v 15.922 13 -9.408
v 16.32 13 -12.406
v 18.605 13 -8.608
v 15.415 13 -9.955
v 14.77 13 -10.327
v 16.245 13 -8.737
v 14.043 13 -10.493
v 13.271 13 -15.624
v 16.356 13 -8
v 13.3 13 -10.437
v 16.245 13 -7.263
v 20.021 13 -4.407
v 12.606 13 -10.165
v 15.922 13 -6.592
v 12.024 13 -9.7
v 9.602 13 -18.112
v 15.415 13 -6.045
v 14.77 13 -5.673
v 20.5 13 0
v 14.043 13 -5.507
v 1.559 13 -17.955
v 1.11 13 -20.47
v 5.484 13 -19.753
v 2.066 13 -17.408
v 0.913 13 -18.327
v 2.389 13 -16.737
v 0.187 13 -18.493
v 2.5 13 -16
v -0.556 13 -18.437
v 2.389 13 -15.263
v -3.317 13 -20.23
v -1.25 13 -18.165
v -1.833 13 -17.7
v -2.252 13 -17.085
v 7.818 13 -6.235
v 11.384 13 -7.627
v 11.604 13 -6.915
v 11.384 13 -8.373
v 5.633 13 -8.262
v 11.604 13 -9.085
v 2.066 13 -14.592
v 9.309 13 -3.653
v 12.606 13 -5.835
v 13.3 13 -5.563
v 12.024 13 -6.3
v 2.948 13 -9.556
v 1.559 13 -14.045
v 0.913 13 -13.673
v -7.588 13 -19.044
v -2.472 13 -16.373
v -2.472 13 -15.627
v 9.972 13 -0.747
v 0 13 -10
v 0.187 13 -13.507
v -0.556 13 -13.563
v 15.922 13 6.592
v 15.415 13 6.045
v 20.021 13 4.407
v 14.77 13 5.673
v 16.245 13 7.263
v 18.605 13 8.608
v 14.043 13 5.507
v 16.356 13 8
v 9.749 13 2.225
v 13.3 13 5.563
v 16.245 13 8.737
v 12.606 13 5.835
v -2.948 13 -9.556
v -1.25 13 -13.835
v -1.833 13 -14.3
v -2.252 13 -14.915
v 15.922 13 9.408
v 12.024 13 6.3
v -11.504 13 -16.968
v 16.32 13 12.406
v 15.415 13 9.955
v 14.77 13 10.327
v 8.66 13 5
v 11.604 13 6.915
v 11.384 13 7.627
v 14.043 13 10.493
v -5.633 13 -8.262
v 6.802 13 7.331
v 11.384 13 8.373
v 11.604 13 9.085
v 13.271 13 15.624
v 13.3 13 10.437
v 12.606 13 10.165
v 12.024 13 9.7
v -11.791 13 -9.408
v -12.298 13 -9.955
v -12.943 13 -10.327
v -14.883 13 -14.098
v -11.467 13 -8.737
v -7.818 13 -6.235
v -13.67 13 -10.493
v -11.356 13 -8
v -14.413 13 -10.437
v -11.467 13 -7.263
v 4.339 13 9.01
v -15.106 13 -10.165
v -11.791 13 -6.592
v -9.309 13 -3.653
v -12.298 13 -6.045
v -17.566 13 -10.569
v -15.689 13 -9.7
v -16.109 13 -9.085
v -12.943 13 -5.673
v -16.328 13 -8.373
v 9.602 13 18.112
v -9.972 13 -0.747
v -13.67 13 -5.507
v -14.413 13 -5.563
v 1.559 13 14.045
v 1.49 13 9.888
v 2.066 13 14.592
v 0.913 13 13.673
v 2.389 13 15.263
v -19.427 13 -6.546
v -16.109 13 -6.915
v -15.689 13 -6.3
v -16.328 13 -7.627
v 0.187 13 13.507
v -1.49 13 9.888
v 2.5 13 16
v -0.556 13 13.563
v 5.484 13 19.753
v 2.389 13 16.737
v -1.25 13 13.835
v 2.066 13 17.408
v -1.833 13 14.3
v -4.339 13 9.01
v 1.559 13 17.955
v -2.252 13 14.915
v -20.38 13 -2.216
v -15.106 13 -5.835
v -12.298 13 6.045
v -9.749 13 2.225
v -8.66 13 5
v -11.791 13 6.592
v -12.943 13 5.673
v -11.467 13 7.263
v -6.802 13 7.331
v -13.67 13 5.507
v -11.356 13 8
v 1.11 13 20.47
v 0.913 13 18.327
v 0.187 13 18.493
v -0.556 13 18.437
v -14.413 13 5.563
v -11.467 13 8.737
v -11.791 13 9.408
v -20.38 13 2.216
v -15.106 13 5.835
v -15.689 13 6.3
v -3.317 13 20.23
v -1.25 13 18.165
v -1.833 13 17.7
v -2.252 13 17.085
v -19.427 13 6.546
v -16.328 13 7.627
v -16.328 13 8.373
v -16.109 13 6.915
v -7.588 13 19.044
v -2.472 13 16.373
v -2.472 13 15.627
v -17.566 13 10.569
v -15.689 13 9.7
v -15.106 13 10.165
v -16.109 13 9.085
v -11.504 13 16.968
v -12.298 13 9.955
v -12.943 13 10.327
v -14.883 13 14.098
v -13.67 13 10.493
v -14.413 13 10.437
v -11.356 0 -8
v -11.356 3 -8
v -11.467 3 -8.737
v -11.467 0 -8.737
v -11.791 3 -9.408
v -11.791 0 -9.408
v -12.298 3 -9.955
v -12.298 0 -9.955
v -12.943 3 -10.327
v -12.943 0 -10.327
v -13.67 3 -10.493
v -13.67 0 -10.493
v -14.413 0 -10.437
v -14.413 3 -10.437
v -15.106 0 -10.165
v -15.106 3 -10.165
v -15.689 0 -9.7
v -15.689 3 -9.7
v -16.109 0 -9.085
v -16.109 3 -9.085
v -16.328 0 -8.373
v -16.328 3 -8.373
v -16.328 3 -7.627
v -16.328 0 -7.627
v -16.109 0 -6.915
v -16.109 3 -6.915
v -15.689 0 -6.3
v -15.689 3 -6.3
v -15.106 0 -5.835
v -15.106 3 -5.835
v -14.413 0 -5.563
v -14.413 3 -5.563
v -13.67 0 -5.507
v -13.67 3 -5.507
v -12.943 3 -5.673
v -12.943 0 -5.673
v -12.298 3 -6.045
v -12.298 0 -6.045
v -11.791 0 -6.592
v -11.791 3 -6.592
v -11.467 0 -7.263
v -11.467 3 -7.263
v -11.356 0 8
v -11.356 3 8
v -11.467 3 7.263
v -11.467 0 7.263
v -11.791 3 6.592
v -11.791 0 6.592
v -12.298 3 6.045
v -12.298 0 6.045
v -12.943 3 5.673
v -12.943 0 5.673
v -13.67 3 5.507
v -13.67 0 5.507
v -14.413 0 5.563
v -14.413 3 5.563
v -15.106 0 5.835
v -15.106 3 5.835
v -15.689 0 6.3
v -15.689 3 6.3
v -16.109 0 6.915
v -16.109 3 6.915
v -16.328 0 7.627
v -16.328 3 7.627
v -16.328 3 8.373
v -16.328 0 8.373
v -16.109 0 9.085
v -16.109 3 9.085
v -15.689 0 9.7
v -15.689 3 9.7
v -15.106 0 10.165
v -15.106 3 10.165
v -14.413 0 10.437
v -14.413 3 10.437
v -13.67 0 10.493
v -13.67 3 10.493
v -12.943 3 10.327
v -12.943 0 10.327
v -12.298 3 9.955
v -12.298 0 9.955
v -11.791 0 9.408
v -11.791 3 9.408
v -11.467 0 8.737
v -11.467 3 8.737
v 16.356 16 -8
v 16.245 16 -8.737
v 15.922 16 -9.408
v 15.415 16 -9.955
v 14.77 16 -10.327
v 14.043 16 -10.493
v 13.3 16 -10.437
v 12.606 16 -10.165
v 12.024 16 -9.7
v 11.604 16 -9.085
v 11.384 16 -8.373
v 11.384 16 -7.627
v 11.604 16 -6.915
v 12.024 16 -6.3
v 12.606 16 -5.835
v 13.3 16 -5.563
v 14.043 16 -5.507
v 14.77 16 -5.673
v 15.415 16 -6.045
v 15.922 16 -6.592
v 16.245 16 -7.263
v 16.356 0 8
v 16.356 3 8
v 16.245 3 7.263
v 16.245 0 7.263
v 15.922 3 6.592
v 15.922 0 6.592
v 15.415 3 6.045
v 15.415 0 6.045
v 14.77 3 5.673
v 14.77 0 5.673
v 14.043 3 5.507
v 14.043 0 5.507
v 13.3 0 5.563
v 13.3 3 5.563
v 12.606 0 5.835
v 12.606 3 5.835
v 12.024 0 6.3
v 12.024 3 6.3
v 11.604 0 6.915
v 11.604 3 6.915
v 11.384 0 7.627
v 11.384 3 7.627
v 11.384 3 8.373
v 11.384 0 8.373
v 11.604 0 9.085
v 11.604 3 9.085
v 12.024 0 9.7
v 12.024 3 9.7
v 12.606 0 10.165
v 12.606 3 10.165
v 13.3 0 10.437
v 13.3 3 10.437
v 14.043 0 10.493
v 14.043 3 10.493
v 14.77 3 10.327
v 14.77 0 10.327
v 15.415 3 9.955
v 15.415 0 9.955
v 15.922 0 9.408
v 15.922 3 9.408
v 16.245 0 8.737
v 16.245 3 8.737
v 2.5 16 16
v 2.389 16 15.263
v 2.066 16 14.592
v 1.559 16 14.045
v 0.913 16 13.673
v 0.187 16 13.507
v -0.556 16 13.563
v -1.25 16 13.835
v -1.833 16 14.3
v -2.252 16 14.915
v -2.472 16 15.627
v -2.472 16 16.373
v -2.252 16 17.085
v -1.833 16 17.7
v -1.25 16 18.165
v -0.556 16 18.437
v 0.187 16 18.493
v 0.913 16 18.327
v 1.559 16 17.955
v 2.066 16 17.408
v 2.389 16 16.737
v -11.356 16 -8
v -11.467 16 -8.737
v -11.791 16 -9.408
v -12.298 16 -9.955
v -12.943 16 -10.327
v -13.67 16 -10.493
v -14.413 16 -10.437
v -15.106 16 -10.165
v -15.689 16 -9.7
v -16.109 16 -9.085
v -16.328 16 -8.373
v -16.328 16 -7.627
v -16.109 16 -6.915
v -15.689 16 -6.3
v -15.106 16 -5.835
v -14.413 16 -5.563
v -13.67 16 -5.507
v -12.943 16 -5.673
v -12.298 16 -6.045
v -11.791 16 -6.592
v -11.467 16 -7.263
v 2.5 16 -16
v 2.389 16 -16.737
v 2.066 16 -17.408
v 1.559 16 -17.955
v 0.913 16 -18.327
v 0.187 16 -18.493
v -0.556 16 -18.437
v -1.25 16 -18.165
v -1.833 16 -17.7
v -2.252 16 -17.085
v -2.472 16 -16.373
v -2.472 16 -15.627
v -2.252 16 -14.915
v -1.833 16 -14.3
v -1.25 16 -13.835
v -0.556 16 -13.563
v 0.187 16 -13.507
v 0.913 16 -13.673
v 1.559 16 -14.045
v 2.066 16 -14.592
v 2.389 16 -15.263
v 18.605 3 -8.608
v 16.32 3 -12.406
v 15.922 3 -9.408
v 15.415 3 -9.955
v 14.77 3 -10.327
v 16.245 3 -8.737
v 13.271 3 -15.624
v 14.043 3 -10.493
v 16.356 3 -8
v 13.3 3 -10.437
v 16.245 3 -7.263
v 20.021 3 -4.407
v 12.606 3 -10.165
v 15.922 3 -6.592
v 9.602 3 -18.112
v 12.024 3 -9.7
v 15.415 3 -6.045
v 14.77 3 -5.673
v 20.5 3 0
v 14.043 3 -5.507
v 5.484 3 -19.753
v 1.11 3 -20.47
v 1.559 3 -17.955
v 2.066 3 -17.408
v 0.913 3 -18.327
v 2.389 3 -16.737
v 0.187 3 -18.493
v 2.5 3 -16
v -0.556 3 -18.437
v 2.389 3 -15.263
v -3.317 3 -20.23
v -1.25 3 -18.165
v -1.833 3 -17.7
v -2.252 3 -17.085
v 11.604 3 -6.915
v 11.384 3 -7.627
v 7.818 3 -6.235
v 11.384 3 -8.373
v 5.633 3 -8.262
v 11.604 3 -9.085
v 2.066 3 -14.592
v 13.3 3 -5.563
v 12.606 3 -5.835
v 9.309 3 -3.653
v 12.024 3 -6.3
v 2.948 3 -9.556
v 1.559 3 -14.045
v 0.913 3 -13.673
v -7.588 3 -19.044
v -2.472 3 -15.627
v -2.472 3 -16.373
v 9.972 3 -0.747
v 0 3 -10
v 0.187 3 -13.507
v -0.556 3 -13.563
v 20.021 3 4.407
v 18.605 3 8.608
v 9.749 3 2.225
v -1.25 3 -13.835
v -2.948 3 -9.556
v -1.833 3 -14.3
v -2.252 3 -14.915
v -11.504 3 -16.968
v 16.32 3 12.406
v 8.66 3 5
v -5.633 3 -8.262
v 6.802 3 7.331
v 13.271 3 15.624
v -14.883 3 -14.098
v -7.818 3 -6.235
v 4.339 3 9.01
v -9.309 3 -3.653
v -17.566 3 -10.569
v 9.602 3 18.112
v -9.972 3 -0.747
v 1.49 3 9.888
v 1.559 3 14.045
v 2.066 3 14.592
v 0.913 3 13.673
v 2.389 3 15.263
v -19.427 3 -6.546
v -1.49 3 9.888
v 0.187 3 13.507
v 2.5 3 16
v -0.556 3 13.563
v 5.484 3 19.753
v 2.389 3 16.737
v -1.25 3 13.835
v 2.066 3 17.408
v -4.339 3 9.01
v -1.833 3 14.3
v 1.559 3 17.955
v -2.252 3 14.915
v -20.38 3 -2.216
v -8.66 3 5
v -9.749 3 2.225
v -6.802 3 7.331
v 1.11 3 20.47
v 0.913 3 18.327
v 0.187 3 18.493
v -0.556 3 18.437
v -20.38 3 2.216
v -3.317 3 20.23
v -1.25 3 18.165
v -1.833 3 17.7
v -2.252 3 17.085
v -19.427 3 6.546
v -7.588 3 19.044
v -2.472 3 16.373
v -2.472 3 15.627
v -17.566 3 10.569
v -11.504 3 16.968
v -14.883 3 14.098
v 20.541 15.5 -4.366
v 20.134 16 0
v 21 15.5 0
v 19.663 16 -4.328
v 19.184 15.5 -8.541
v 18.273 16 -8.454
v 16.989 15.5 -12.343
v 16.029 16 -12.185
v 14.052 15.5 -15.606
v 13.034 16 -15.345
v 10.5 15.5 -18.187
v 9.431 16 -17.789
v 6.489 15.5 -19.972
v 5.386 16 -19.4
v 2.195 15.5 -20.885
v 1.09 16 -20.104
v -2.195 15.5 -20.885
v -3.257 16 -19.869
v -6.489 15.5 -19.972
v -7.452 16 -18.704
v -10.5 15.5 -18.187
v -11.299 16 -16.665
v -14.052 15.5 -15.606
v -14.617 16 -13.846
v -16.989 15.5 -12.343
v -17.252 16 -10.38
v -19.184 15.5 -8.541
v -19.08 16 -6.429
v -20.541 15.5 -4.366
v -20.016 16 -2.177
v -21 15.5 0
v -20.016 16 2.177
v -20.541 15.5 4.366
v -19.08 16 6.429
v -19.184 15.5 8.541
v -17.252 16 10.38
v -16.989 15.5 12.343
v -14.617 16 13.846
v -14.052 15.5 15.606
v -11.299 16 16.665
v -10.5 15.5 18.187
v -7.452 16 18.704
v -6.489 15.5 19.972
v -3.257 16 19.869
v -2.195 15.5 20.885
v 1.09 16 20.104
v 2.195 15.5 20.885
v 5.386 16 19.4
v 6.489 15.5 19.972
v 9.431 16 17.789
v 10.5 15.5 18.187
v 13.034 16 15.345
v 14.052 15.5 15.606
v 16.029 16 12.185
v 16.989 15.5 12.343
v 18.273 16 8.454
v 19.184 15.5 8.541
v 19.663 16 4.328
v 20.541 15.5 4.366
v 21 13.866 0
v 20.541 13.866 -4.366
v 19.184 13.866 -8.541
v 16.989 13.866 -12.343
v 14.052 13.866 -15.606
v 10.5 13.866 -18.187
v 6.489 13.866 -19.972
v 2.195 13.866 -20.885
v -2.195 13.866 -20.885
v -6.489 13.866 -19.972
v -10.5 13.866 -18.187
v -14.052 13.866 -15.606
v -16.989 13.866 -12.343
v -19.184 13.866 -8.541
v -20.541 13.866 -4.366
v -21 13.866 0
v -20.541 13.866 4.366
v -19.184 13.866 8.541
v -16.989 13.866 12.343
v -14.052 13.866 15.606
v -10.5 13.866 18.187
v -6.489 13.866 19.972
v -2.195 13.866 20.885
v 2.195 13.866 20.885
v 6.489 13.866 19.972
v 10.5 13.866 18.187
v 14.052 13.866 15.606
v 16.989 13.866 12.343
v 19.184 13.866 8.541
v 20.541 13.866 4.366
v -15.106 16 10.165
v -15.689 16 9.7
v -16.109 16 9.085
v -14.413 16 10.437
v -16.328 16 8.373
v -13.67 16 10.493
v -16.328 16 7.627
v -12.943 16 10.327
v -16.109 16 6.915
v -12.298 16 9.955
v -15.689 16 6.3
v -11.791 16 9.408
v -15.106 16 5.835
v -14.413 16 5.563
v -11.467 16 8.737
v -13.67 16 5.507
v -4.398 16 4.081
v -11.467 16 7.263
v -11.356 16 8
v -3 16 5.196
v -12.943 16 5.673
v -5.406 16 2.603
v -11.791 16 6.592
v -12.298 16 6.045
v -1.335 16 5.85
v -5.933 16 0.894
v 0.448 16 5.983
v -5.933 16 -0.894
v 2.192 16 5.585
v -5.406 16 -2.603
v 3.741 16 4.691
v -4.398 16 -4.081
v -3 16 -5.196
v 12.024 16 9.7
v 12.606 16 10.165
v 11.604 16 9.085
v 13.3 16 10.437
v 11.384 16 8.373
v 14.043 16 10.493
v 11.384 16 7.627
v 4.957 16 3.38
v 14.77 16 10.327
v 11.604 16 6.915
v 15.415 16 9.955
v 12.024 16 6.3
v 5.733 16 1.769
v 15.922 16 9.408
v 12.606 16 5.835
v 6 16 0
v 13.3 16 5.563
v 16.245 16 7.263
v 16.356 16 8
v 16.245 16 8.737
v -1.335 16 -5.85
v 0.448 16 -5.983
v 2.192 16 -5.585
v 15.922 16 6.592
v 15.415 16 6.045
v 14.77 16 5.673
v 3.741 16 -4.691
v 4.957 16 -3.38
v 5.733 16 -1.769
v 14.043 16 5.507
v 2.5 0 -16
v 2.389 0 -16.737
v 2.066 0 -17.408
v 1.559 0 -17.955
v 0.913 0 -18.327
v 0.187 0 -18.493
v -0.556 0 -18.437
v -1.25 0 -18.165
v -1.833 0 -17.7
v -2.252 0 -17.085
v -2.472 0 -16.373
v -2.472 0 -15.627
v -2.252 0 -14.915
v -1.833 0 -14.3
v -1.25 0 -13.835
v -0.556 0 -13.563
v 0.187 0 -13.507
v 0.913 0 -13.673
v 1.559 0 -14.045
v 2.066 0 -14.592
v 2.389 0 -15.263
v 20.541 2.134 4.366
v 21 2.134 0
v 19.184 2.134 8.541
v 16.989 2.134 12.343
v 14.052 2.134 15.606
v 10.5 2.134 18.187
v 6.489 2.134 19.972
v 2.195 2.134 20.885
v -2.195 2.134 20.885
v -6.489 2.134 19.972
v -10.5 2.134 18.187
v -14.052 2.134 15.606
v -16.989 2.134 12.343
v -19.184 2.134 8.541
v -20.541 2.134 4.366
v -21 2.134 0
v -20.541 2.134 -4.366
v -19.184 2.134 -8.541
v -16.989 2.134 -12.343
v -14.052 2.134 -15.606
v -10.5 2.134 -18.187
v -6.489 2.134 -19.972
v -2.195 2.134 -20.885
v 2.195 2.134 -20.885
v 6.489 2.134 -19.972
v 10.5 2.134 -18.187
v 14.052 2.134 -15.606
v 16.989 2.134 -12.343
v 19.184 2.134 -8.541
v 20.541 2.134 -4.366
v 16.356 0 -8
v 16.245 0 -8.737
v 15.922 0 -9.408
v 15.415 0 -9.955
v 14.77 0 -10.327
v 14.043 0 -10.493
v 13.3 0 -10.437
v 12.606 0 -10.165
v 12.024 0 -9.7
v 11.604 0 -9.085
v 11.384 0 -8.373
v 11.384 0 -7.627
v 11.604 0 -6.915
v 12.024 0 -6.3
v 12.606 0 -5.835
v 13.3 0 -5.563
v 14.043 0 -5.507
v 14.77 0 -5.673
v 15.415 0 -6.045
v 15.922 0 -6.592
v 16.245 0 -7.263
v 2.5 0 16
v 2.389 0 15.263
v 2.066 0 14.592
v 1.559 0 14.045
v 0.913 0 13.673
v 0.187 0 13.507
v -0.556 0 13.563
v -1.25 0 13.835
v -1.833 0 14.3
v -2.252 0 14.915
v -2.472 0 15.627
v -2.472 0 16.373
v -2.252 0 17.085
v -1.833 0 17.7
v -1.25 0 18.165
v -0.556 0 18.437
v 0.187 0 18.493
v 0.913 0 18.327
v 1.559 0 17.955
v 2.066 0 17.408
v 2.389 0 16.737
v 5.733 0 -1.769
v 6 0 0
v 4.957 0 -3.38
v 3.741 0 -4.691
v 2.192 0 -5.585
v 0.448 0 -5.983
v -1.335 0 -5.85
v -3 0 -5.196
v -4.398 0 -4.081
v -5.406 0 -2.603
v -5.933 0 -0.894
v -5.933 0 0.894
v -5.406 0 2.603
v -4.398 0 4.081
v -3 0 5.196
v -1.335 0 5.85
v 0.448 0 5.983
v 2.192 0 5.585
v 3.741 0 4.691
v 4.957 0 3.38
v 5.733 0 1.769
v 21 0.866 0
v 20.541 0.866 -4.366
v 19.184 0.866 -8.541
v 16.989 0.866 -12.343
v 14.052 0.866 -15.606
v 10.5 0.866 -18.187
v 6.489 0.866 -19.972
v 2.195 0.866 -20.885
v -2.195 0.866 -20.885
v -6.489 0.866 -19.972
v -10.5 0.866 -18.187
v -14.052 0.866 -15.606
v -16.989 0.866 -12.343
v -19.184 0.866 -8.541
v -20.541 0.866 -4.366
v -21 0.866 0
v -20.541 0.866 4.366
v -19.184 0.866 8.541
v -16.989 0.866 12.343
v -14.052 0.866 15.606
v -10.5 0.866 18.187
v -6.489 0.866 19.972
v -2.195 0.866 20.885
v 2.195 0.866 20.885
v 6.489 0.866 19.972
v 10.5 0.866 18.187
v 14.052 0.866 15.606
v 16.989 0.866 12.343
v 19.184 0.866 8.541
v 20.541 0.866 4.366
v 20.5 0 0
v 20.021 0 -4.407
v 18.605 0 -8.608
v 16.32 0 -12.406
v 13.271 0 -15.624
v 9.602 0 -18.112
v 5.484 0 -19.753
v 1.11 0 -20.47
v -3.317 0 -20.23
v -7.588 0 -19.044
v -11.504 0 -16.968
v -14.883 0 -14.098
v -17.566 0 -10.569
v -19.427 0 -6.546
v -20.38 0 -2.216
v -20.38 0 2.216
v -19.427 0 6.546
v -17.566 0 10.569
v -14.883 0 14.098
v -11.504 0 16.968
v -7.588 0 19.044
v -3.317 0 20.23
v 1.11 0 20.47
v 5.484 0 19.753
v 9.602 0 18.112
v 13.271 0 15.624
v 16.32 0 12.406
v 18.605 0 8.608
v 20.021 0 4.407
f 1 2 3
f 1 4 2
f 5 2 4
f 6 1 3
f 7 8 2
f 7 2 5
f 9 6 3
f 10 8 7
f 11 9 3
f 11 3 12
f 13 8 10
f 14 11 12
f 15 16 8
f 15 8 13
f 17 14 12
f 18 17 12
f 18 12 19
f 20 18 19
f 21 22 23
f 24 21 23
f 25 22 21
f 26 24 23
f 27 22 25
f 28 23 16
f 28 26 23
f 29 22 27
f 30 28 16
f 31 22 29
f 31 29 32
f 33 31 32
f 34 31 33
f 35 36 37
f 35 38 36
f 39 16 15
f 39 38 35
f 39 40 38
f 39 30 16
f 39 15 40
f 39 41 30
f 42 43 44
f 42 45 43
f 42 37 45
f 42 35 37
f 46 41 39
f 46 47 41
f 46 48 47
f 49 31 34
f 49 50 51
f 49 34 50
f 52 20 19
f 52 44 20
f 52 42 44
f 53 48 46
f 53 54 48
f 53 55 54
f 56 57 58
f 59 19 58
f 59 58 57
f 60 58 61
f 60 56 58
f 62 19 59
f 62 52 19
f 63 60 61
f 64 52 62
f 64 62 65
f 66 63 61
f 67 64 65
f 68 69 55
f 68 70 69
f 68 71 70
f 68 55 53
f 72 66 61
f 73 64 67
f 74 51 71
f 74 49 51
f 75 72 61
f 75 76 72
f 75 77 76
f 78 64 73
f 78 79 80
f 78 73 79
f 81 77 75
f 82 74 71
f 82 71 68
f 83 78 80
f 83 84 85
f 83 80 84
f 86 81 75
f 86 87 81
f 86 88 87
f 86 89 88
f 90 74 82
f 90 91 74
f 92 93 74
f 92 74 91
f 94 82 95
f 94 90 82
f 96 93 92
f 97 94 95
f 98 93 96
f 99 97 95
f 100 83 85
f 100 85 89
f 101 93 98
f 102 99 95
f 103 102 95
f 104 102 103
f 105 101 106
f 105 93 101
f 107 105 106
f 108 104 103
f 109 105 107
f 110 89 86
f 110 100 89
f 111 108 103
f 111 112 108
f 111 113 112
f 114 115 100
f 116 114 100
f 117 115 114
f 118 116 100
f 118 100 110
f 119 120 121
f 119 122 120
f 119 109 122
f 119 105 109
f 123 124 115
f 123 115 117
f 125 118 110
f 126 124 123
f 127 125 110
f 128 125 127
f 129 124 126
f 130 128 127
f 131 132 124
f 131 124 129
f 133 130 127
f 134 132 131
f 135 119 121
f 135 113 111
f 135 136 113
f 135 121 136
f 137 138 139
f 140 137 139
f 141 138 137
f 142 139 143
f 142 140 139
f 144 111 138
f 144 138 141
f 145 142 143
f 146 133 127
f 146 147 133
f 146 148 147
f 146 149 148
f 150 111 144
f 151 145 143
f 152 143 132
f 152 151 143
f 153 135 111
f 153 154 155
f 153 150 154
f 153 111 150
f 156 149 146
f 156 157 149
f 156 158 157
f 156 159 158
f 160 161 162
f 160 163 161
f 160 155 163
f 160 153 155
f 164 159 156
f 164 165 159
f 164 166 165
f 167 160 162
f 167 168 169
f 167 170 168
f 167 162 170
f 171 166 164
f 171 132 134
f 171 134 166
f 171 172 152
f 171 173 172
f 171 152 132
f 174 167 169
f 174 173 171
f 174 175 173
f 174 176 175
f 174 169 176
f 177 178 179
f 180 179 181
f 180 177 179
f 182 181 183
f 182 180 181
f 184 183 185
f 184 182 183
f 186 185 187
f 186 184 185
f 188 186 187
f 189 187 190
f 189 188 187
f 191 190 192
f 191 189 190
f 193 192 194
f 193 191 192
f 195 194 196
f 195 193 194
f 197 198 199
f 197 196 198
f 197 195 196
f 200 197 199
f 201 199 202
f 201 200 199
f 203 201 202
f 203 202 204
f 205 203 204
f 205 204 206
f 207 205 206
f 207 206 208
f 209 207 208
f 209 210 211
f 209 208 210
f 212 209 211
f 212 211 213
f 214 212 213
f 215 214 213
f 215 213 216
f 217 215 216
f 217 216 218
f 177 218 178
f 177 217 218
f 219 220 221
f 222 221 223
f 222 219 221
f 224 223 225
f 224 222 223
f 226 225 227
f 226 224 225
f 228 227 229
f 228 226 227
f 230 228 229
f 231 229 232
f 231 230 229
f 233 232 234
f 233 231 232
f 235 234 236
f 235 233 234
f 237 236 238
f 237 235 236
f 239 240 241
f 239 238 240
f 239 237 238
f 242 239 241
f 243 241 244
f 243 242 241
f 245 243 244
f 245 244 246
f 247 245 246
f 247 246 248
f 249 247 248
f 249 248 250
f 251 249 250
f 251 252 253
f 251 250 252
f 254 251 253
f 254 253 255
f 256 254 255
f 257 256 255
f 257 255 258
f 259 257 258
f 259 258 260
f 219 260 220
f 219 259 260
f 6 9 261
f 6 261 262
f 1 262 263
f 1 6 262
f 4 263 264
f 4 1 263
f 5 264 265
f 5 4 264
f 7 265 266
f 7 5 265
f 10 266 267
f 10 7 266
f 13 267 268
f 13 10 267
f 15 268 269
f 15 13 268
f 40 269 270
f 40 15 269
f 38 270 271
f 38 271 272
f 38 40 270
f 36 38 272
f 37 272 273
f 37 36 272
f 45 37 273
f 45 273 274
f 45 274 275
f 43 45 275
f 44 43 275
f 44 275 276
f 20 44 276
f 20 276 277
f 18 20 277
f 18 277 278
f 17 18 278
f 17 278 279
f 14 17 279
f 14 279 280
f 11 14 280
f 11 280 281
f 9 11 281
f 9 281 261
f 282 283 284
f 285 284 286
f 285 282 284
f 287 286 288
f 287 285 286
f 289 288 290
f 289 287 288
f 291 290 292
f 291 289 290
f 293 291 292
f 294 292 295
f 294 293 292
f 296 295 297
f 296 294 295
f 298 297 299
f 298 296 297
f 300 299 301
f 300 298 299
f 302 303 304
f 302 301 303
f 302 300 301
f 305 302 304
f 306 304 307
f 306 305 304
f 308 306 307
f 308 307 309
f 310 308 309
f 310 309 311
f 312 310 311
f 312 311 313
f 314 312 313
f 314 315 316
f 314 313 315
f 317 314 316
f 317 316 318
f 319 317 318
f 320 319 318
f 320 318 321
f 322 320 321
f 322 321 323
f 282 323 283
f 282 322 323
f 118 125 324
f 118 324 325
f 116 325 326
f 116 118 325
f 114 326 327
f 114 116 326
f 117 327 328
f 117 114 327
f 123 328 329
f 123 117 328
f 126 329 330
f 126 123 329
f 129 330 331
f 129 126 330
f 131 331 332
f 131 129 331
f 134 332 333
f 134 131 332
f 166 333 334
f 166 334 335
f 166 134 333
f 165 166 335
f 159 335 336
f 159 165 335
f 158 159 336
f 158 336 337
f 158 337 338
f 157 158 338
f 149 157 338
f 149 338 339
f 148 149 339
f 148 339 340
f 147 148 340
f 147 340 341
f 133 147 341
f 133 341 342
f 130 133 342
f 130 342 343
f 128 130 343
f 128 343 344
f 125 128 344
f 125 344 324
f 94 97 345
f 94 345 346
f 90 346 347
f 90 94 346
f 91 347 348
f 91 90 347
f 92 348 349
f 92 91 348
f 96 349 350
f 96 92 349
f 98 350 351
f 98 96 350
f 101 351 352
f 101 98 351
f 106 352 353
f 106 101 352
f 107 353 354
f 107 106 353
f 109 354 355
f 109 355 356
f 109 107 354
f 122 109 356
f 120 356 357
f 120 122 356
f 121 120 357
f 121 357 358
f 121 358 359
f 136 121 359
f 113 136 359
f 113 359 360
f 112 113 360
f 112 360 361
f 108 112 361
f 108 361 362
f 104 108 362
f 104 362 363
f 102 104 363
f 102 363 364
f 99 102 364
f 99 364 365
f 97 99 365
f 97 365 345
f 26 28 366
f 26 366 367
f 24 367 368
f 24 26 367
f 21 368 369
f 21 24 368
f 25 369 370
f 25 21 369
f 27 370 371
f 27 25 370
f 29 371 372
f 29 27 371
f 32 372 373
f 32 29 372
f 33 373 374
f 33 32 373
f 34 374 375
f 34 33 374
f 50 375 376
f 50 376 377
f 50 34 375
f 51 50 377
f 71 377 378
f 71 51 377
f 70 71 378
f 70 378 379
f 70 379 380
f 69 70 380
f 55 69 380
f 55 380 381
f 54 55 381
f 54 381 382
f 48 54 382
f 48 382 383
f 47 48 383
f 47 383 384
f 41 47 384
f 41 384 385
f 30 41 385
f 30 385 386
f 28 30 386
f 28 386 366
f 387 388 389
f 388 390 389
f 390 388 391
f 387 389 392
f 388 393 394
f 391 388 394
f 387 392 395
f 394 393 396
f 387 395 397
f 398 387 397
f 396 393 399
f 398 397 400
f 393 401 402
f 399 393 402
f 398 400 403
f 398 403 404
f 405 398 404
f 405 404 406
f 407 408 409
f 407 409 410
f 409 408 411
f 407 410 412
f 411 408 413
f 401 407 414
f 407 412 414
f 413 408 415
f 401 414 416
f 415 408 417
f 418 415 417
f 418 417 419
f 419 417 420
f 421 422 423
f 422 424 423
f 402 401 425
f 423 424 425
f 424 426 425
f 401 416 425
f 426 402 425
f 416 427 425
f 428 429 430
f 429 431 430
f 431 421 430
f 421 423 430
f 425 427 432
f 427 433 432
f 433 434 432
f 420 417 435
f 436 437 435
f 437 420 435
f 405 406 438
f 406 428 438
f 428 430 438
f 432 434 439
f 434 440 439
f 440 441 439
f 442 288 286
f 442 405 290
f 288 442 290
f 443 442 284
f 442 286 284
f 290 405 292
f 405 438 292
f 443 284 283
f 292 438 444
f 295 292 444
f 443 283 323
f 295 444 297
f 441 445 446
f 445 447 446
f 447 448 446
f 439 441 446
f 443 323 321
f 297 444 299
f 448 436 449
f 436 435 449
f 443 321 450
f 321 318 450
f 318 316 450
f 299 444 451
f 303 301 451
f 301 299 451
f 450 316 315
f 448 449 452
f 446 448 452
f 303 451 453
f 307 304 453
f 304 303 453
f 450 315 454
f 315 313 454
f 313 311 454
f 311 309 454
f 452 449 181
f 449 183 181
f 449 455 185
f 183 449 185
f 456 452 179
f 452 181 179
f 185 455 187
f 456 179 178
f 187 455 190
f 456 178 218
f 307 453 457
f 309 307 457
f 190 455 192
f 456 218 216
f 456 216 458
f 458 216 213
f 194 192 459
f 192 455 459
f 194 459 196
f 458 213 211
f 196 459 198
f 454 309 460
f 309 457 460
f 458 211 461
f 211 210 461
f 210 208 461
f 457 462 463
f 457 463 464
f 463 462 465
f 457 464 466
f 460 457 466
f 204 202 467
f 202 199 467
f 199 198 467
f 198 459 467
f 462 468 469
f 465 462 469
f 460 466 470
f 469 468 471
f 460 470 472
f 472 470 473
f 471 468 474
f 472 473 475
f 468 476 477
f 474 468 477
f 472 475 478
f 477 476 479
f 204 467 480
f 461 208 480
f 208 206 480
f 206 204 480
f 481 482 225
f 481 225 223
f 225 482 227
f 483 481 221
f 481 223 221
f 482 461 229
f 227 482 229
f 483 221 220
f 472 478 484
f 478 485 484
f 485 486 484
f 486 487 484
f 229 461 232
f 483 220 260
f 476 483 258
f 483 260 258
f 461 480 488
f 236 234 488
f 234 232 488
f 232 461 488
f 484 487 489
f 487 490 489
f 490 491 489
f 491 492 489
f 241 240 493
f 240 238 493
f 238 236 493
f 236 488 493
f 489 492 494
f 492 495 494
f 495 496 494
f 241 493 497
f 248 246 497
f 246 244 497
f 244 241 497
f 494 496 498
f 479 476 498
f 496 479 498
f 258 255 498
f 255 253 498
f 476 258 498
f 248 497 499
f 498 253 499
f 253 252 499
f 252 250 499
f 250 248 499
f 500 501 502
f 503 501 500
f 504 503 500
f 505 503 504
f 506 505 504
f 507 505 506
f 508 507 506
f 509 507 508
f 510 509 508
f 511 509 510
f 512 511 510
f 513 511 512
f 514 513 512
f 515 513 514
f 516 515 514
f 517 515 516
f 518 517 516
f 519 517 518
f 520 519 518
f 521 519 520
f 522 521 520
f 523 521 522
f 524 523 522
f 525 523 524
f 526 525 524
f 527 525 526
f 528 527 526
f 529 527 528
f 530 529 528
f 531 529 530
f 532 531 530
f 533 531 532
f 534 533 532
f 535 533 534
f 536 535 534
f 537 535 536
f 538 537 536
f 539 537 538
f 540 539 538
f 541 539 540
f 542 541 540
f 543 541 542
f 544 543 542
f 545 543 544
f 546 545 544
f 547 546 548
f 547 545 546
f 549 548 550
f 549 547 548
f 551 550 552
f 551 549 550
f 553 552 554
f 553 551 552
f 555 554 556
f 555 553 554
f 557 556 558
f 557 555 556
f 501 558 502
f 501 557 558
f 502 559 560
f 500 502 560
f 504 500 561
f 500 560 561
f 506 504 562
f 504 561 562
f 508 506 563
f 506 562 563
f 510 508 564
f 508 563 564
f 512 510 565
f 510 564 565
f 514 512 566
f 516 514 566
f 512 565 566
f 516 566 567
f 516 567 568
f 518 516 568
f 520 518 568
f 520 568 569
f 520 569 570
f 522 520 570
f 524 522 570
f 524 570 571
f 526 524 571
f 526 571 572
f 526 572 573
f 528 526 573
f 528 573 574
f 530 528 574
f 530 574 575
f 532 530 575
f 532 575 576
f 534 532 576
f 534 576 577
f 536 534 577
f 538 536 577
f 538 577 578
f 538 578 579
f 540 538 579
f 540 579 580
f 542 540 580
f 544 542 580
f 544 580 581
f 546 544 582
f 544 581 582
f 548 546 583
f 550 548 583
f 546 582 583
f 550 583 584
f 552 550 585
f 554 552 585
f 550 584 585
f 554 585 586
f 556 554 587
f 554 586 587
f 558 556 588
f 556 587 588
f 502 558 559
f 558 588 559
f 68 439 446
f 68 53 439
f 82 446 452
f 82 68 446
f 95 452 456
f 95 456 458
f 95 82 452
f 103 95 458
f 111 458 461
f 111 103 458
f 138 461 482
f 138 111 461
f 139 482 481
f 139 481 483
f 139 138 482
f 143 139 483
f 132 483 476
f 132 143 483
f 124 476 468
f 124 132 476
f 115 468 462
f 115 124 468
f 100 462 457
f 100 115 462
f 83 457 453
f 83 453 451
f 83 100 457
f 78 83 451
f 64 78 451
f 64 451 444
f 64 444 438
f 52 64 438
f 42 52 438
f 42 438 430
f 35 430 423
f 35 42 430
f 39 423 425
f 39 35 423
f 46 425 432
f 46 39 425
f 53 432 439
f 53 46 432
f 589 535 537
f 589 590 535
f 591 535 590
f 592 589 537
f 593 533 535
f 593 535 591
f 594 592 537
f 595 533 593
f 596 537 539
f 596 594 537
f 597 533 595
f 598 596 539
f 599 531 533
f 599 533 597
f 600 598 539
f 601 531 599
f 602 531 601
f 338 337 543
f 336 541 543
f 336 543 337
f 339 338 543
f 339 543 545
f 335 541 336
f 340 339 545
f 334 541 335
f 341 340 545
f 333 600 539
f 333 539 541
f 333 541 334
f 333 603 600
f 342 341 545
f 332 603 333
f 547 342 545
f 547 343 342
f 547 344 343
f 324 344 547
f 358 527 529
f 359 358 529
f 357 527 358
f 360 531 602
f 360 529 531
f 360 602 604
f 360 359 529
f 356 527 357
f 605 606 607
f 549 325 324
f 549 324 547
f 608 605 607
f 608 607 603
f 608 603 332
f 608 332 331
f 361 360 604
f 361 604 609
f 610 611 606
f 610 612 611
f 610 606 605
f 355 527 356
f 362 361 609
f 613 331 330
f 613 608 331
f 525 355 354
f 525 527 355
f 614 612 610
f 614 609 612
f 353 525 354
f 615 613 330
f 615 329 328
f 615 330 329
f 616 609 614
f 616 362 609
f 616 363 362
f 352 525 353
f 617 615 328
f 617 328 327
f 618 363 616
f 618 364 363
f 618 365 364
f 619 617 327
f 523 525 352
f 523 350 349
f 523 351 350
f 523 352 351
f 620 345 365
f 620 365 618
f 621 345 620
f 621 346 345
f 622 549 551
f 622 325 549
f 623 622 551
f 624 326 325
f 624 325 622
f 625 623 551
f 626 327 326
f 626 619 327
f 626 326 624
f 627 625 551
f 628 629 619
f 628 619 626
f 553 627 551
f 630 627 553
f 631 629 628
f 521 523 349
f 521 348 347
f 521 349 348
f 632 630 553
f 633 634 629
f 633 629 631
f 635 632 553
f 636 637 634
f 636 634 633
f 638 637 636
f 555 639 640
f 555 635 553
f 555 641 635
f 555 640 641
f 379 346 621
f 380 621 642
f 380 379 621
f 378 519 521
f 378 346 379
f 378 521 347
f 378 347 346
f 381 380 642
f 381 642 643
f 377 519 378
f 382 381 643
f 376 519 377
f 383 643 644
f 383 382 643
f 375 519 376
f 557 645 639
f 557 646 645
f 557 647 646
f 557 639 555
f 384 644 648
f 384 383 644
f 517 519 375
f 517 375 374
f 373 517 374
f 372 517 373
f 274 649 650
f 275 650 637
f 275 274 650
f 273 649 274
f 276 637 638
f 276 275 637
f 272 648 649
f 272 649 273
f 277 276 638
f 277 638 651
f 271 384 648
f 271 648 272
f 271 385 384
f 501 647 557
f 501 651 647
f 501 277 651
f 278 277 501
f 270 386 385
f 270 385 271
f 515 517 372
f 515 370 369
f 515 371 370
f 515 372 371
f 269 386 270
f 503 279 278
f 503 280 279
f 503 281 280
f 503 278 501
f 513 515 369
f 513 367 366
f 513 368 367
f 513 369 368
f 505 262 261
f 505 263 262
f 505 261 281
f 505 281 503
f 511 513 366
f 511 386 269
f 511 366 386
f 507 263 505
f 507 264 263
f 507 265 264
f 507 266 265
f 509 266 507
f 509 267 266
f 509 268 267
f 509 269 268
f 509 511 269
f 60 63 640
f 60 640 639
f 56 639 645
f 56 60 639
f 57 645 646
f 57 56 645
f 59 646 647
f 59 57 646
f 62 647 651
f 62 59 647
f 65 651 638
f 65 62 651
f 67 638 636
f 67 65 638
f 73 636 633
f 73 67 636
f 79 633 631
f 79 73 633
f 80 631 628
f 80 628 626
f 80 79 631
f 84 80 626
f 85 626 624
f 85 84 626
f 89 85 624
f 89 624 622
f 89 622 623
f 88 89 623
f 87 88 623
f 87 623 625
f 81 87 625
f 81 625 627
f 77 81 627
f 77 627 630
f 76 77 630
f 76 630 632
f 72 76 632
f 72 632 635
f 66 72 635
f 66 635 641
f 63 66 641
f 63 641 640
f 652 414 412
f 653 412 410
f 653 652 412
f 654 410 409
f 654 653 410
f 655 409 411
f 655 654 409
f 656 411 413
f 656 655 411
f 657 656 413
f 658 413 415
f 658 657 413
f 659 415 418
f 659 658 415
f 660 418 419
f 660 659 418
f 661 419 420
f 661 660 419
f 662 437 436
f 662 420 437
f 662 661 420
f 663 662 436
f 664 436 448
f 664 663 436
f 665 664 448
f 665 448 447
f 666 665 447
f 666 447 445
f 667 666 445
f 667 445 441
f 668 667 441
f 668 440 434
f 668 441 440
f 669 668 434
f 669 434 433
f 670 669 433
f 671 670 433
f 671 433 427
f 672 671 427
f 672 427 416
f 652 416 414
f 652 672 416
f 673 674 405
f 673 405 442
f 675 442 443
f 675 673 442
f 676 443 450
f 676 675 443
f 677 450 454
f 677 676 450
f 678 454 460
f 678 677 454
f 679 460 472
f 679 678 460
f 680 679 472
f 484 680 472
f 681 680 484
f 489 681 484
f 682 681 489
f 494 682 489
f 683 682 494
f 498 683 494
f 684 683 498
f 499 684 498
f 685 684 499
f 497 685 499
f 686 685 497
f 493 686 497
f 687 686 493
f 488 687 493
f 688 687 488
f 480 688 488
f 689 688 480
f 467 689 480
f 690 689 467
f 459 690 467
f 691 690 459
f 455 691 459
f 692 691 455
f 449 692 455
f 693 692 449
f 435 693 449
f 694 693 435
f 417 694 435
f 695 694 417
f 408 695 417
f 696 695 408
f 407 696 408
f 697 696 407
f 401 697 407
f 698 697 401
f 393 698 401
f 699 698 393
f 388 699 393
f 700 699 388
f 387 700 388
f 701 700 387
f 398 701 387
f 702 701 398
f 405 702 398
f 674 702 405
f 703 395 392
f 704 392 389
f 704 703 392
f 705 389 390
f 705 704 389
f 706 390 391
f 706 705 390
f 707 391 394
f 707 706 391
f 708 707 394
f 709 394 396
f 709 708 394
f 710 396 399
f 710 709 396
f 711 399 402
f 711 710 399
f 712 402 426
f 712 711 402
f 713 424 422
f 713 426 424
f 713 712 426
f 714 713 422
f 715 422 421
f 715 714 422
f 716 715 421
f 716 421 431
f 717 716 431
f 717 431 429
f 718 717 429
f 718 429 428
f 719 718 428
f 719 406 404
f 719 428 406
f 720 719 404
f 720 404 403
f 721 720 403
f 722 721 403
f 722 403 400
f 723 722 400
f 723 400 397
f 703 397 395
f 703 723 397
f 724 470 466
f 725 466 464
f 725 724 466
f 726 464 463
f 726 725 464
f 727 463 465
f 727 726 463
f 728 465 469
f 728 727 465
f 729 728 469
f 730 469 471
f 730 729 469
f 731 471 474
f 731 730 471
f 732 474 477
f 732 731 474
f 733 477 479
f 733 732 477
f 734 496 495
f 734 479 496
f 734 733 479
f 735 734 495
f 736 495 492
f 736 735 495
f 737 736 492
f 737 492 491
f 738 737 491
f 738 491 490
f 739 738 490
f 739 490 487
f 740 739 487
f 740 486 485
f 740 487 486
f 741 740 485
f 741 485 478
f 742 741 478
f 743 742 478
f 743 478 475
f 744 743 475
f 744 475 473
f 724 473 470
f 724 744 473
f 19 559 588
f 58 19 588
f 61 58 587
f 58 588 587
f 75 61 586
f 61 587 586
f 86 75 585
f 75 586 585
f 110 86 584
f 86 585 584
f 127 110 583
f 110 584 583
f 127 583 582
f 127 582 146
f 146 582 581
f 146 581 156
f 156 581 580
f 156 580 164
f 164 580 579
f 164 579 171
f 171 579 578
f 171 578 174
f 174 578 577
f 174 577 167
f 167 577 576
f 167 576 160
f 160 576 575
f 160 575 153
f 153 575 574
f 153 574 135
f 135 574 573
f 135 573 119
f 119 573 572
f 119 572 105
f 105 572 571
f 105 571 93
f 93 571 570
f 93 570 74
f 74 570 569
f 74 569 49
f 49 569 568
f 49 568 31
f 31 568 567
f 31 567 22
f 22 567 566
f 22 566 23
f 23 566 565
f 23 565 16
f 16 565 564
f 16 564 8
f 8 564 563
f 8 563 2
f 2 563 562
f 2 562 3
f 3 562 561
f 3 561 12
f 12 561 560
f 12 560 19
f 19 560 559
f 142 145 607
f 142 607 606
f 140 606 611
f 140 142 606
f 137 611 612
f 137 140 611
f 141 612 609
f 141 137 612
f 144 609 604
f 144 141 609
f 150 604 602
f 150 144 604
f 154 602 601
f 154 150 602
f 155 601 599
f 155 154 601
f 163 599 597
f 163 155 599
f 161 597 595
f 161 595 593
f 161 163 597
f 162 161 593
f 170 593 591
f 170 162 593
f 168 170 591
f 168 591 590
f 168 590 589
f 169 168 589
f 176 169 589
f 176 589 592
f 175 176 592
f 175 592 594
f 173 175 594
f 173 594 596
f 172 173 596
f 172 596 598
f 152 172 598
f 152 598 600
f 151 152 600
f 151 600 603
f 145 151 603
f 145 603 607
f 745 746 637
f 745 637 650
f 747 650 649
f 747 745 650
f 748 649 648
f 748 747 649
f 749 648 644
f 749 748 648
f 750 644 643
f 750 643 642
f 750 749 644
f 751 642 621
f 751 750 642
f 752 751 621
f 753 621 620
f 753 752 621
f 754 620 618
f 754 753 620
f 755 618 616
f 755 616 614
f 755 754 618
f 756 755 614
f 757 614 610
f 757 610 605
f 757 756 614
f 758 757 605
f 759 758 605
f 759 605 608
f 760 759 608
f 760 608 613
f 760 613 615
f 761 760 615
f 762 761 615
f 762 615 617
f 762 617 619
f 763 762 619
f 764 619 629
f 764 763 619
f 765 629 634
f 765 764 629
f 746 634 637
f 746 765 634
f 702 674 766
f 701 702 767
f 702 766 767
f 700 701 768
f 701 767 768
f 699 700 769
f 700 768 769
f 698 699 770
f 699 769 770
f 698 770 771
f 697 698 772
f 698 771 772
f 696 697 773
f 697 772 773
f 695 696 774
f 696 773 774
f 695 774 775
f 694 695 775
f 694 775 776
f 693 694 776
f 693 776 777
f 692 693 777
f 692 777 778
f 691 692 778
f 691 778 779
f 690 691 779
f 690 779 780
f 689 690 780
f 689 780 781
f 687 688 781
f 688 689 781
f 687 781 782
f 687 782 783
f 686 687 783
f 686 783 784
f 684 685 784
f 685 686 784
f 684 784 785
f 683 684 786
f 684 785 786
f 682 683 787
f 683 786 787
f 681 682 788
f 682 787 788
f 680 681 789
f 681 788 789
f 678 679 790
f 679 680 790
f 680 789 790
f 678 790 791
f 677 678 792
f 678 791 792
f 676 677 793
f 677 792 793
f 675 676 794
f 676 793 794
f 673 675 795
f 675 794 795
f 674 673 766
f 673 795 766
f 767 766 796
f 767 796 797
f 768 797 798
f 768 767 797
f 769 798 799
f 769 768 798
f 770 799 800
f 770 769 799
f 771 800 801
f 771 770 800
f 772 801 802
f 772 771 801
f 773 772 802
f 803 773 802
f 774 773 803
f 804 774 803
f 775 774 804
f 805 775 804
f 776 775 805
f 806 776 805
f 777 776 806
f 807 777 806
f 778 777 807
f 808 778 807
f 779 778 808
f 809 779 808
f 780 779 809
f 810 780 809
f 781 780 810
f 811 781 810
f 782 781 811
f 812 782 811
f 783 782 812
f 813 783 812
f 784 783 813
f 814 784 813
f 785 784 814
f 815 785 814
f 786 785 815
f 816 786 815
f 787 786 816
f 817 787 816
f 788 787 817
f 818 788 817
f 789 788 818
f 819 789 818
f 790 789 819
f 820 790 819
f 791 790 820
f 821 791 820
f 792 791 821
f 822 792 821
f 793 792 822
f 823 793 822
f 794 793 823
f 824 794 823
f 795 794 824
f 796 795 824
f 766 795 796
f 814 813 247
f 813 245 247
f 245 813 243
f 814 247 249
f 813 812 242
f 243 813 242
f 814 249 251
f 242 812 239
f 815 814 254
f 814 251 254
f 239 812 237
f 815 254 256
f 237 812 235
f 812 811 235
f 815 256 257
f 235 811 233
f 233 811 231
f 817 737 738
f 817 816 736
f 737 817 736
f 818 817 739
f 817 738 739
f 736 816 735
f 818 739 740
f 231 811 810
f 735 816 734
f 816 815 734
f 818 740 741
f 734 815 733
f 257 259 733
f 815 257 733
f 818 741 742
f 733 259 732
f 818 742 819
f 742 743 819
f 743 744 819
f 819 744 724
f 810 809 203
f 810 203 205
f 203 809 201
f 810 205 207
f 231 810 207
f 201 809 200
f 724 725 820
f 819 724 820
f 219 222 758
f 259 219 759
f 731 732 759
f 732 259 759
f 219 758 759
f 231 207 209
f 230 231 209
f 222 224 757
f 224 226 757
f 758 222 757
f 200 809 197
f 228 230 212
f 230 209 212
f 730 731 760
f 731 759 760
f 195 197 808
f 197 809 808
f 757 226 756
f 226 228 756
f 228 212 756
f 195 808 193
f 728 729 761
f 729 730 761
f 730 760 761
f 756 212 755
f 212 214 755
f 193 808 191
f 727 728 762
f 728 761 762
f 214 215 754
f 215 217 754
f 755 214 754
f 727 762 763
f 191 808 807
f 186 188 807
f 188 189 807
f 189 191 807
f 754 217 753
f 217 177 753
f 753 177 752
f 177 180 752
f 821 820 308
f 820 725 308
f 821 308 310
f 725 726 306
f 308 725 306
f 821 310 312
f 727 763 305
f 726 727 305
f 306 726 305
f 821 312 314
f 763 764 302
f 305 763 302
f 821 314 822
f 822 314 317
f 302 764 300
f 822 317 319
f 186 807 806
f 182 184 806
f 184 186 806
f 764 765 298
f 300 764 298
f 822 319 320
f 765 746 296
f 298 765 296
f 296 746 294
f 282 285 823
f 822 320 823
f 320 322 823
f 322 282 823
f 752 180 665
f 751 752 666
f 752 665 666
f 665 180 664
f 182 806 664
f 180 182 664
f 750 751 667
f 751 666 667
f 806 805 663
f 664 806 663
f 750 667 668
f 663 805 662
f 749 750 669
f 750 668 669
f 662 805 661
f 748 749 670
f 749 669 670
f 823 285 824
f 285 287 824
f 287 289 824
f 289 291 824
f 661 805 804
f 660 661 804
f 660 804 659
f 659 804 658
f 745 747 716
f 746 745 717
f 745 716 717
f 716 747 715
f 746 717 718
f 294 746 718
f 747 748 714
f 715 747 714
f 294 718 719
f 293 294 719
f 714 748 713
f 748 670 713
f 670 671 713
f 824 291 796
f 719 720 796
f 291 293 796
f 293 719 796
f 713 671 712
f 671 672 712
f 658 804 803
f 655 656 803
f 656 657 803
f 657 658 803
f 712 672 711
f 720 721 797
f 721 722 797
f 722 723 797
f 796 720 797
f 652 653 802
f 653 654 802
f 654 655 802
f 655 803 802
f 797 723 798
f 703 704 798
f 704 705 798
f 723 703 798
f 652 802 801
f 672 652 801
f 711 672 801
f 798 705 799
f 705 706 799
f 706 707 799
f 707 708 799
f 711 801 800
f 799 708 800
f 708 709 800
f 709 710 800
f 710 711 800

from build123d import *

# Parameters (mm, degrees)
SKETCH1_R             = 21
SKETCH1_R_2           = 6
SKETCH1_R_3           = 2.5
BOSS_EXTRUDE1_DEPTH   = 16
SKETCH2_W             = 19.188769359
SKETCH2_H             = 10
CHAMFER1_SIZE         = 0.5
CHAMFER1_SIZE2        = 0.866025404
CHAMFER1_PART_2_SIZE  = 0.5
CHAMFER1_PART_2_SIZE2 = 0.866025404
CHAMFER1_PART_3_SIZE  = 0.5
CHAMFER1_PART_3_SIZE2 = 0.866025404
CHAMFER1_PART_4_SIZE  = 0.5
CHAMFER1_PART_4_SIZE2 = 0.866025404


with BuildPart() as part:
    # Sketch1 → Boss-Extrude1 (new body)
    with BuildSketch(Plane(origin=(0, 0, 0), x_dir=(1, 0, 0), z_dir=(0, 1, 0))):
        Circle(SKETCH1_R)
        Circle(SKETCH1_R_2, mode=Mode.SUBTRACT)
        with Locations((0, 16)):
            Circle(SKETCH1_R_3, mode=Mode.SUBTRACT)
        with Locations((13.856406461, 8)):
            Circle(SKETCH1_R_3, mode=Mode.SUBTRACT)
        with Locations((13.856406461, -8)):
            Circle(SKETCH1_R_3, mode=Mode.SUBTRACT)
        with Locations((0, -16)):
            Circle(SKETCH1_R_3, mode=Mode.SUBTRACT)
        with Locations((-13.856406461, -8)):
            Circle(SKETCH1_R_3, mode=Mode.SUBTRACT)
        with Locations((-13.856406461, 8)):
            Circle(SKETCH1_R_3, mode=Mode.SUBTRACT)
    extrude(amount=BOSS_EXTRUDE1_DEPTH)

    # Sketch2 → Cut-Revolve1 (revolve, cut)
    with BuildSketch(Plane(origin=(0, 0, 0), x_dir=(0, 0, -1), z_dir=(1, 0, 0))):
        with Locations((19.59438468, 8)):
            Rectangle(SKETCH2_W, SKETCH2_H)
    revolve(axis=Axis((0, 0, 0), (0, 1, 0)), mode=Mode.SUBTRACT)

    # Chamfer1
    chamfer1_edges = [part.edges().sort_by_distance(p)[0] for p in [
        (-21, 0, 0),
    ]]
    chamfer1_side = [part.faces().sort_by_distance(p)[0] for p in [
        (-20.406030304, 0, 0),
    ]]
    chamfer(chamfer1_edges, length=CHAMFER1_SIZE, length2=CHAMFER1_SIZE2, reference=chamfer1_side[0])

    # Chamfer1 part 2
    chamfer1_part_2_edges = [part.edges().sort_by_distance(p)[0] for p in [
        (-21, 3, 0),
    ]]
    chamfer1_part_2_side = [part.faces().sort_by_distance(p)[0] for p in [
        (-20.406030304, 3, 0),
    ]]
    chamfer(chamfer1_part_2_edges, length=CHAMFER1_PART_2_SIZE, length2=CHAMFER1_PART_2_SIZE2, reference=chamfer1_part_2_side[0])

    # Chamfer1 part 3
    chamfer1_part_3_edges = [part.edges().sort_by_distance(p)[0] for p in [
        (-21, 13, 0),
    ]]
    chamfer1_part_3_side = [part.faces().sort_by_distance(p)[0] for p in [
        (-20.406030304, 13, 0),
    ]]
    chamfer(chamfer1_part_3_edges, length=CHAMFER1_PART_3_SIZE, length2=CHAMFER1_PART_3_SIZE2, reference=chamfer1_part_3_side[0])

    # Chamfer1 part 4
    chamfer1_part_4_edges = [part.edges().sort_by_distance(p)[0] for p in [
        (-21, 16, 0),
    ]]
    chamfer1_part_4_side = [part.faces().sort_by_distance(p)[0] for p in [
        (-21, 14.5, 0),
    ]]
    chamfer(chamfer1_part_4_edges, length=CHAMFER1_PART_4_SIZE, length2=CHAMFER1_PART_4_SIZE2, reference=chamfer1_part_4_side[0])


solid = part.part
